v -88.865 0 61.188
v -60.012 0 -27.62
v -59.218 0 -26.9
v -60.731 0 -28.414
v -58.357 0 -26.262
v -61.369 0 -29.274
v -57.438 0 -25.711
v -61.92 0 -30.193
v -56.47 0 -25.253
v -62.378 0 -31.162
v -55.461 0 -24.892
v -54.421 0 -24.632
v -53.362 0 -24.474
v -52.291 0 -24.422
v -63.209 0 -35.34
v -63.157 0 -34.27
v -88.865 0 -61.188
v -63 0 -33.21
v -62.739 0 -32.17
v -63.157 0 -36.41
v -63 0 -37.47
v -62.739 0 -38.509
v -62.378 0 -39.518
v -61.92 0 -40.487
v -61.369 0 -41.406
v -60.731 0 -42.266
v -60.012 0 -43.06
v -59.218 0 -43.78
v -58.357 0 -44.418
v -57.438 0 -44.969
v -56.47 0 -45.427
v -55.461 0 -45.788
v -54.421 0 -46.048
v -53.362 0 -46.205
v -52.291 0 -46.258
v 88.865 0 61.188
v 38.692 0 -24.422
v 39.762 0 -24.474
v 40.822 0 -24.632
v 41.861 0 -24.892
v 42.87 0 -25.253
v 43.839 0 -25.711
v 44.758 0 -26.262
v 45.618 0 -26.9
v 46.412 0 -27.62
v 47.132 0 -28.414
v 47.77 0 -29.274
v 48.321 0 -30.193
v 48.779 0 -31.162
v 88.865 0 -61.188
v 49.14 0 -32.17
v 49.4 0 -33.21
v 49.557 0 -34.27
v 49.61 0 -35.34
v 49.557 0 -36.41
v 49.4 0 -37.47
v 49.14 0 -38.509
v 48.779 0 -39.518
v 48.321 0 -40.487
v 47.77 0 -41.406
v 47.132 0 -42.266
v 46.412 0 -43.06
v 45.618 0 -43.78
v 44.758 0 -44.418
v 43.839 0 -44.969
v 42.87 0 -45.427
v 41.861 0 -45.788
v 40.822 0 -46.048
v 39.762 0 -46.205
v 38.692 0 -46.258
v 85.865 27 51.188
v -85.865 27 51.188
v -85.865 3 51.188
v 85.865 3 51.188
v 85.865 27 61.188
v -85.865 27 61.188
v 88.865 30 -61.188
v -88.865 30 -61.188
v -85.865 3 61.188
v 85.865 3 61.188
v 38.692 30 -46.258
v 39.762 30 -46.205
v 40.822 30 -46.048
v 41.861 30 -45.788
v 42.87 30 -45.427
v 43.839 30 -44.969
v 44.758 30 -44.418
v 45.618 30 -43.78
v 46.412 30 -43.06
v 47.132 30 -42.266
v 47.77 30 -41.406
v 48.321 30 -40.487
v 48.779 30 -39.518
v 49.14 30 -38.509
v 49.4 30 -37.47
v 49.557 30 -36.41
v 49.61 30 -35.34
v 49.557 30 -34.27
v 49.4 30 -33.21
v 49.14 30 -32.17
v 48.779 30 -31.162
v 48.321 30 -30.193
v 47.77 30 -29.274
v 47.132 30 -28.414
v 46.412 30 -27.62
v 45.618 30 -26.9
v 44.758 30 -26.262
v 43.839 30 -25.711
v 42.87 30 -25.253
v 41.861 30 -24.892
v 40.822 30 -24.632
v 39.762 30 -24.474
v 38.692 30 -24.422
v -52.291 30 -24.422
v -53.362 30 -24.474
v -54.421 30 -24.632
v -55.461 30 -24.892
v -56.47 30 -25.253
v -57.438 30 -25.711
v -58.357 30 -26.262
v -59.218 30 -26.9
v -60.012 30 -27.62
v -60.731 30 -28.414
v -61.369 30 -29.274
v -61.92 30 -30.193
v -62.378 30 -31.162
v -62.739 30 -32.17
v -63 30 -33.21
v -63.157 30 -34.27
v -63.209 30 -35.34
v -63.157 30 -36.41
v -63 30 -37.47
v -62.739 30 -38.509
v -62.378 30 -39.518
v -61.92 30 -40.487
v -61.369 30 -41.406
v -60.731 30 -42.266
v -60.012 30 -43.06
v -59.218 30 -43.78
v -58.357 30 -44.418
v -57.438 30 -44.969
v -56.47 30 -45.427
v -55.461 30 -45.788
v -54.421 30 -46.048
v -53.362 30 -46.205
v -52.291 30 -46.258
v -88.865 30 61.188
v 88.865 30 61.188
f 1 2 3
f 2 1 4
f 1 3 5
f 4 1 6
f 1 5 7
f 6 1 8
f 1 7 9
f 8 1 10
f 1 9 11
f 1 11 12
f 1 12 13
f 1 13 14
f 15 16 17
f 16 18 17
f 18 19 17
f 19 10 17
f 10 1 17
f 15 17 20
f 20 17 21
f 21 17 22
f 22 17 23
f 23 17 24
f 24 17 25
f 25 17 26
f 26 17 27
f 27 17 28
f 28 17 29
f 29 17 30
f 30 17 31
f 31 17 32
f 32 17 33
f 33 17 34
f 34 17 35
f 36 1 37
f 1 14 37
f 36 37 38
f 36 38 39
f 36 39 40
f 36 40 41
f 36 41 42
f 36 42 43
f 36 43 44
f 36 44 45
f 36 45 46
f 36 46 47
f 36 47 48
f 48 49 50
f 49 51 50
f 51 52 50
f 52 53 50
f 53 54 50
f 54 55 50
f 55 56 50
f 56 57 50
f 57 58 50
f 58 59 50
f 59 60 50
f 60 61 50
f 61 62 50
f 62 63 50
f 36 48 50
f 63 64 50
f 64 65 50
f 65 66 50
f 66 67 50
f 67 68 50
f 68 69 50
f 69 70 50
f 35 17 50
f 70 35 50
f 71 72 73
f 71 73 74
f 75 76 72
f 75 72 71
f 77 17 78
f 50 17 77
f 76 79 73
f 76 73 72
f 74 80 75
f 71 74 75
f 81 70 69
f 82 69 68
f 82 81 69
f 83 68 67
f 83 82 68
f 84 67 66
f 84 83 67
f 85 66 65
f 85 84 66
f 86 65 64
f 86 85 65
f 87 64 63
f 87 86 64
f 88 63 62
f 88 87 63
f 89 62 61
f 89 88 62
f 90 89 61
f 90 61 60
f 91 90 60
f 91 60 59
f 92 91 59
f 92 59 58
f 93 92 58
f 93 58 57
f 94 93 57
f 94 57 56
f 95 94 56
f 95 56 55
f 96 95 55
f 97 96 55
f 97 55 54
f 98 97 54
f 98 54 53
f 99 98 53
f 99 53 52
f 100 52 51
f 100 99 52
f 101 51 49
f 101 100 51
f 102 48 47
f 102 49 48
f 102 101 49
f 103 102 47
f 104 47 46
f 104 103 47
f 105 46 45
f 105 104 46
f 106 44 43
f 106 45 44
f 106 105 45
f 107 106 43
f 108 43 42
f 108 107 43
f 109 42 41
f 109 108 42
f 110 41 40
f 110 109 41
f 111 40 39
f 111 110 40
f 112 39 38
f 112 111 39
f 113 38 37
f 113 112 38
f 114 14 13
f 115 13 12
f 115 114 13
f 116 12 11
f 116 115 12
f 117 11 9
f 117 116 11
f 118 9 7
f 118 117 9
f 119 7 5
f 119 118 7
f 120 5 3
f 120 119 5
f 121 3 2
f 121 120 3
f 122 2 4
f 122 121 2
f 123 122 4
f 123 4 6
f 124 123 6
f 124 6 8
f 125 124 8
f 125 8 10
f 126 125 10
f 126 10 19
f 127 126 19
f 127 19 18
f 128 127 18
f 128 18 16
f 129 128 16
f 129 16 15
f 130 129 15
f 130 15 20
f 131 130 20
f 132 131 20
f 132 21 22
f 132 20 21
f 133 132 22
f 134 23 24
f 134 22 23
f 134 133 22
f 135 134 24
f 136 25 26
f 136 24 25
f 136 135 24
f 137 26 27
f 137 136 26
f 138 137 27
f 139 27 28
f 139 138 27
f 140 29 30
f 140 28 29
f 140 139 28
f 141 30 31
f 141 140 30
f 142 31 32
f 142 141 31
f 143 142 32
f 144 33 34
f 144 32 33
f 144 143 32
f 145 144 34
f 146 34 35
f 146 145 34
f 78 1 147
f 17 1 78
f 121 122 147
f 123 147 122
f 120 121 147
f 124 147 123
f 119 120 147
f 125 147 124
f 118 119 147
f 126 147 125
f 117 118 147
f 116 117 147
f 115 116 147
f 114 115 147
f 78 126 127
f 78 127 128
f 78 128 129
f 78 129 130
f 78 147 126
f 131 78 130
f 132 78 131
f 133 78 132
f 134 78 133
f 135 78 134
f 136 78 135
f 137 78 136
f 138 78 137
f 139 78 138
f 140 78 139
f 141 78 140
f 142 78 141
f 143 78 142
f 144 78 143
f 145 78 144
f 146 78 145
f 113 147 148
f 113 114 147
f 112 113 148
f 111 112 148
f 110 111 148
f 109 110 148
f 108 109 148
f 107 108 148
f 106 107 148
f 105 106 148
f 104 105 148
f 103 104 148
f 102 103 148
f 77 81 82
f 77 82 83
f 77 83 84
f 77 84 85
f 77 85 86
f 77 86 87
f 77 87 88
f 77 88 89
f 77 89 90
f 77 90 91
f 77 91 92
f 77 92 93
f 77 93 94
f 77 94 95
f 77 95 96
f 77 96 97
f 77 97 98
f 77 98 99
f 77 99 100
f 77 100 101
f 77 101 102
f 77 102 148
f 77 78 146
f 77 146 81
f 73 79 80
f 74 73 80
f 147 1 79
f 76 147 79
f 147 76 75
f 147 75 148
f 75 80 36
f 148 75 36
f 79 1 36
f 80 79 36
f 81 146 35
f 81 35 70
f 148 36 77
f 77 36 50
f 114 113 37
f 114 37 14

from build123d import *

# Parameters (mm, degrees)
SKETCH1_W           = 177.730901972
SKETCH1_H           = 122.376165744
BOSS_EXTRUDE1_DEPTH = 30
SKETCH2_W           = 171.730901972
SKETCH2_H           = 24
CUT_EXTRUDE1_DEPTH  = 10
CUT_EXTRUDE2_DEPTH  = 112.986828978


with BuildPart() as part:
    # Sketch1 → Boss-Extrude1 (new body)
    with BuildSketch(Plane(origin=(0, 0, 0), x_dir=(1, 0, 0), z_dir=(0, 1, 0))):
        Rectangle(SKETCH1_W, SKETCH1_H)
    extrude(amount=BOSS_EXTRUDE1_DEPTH)

    # Sketch2 → Cut-Extrude1 (cut)
    with BuildSketch(Plane.XY.offset(61.188082872)):
        with Locations((0, 15)):
            Rectangle(SKETCH2_W, SKETCH2_H)
    extrude(amount=-CUT_EXTRUDE1_DEPTH, mode=Mode.SUBTRACT)

    # Sketch3 → Cut-Extrude2 (cut, through all)
    with BuildSketch(Plane(origin=(0, 30, 0), x_dir=(1, 0, 0), z_dir=(0, 1, 0))):
        with BuildLine():
            Line((-52.291434111, 46.257807098), (38.691830368, 46.257807098))
            ThreePointArc((38.691830368, 46.257807098), (49.609822105, 35.339815361), (38.691830368, 24.421823623))
            Line((38.691830368, 24.421823623), (-52.291434111, 24.421823623))
            ThreePointArc((-52.291434111, 24.421823623), (-63.209425848, 35.339815361), (-52.291434111, 46.257807098))
        make_face()
    extrude(amount=-CUT_EXTRUDE2_DEPTH, mode=Mode.SUBTRACT)


solid = part.part
